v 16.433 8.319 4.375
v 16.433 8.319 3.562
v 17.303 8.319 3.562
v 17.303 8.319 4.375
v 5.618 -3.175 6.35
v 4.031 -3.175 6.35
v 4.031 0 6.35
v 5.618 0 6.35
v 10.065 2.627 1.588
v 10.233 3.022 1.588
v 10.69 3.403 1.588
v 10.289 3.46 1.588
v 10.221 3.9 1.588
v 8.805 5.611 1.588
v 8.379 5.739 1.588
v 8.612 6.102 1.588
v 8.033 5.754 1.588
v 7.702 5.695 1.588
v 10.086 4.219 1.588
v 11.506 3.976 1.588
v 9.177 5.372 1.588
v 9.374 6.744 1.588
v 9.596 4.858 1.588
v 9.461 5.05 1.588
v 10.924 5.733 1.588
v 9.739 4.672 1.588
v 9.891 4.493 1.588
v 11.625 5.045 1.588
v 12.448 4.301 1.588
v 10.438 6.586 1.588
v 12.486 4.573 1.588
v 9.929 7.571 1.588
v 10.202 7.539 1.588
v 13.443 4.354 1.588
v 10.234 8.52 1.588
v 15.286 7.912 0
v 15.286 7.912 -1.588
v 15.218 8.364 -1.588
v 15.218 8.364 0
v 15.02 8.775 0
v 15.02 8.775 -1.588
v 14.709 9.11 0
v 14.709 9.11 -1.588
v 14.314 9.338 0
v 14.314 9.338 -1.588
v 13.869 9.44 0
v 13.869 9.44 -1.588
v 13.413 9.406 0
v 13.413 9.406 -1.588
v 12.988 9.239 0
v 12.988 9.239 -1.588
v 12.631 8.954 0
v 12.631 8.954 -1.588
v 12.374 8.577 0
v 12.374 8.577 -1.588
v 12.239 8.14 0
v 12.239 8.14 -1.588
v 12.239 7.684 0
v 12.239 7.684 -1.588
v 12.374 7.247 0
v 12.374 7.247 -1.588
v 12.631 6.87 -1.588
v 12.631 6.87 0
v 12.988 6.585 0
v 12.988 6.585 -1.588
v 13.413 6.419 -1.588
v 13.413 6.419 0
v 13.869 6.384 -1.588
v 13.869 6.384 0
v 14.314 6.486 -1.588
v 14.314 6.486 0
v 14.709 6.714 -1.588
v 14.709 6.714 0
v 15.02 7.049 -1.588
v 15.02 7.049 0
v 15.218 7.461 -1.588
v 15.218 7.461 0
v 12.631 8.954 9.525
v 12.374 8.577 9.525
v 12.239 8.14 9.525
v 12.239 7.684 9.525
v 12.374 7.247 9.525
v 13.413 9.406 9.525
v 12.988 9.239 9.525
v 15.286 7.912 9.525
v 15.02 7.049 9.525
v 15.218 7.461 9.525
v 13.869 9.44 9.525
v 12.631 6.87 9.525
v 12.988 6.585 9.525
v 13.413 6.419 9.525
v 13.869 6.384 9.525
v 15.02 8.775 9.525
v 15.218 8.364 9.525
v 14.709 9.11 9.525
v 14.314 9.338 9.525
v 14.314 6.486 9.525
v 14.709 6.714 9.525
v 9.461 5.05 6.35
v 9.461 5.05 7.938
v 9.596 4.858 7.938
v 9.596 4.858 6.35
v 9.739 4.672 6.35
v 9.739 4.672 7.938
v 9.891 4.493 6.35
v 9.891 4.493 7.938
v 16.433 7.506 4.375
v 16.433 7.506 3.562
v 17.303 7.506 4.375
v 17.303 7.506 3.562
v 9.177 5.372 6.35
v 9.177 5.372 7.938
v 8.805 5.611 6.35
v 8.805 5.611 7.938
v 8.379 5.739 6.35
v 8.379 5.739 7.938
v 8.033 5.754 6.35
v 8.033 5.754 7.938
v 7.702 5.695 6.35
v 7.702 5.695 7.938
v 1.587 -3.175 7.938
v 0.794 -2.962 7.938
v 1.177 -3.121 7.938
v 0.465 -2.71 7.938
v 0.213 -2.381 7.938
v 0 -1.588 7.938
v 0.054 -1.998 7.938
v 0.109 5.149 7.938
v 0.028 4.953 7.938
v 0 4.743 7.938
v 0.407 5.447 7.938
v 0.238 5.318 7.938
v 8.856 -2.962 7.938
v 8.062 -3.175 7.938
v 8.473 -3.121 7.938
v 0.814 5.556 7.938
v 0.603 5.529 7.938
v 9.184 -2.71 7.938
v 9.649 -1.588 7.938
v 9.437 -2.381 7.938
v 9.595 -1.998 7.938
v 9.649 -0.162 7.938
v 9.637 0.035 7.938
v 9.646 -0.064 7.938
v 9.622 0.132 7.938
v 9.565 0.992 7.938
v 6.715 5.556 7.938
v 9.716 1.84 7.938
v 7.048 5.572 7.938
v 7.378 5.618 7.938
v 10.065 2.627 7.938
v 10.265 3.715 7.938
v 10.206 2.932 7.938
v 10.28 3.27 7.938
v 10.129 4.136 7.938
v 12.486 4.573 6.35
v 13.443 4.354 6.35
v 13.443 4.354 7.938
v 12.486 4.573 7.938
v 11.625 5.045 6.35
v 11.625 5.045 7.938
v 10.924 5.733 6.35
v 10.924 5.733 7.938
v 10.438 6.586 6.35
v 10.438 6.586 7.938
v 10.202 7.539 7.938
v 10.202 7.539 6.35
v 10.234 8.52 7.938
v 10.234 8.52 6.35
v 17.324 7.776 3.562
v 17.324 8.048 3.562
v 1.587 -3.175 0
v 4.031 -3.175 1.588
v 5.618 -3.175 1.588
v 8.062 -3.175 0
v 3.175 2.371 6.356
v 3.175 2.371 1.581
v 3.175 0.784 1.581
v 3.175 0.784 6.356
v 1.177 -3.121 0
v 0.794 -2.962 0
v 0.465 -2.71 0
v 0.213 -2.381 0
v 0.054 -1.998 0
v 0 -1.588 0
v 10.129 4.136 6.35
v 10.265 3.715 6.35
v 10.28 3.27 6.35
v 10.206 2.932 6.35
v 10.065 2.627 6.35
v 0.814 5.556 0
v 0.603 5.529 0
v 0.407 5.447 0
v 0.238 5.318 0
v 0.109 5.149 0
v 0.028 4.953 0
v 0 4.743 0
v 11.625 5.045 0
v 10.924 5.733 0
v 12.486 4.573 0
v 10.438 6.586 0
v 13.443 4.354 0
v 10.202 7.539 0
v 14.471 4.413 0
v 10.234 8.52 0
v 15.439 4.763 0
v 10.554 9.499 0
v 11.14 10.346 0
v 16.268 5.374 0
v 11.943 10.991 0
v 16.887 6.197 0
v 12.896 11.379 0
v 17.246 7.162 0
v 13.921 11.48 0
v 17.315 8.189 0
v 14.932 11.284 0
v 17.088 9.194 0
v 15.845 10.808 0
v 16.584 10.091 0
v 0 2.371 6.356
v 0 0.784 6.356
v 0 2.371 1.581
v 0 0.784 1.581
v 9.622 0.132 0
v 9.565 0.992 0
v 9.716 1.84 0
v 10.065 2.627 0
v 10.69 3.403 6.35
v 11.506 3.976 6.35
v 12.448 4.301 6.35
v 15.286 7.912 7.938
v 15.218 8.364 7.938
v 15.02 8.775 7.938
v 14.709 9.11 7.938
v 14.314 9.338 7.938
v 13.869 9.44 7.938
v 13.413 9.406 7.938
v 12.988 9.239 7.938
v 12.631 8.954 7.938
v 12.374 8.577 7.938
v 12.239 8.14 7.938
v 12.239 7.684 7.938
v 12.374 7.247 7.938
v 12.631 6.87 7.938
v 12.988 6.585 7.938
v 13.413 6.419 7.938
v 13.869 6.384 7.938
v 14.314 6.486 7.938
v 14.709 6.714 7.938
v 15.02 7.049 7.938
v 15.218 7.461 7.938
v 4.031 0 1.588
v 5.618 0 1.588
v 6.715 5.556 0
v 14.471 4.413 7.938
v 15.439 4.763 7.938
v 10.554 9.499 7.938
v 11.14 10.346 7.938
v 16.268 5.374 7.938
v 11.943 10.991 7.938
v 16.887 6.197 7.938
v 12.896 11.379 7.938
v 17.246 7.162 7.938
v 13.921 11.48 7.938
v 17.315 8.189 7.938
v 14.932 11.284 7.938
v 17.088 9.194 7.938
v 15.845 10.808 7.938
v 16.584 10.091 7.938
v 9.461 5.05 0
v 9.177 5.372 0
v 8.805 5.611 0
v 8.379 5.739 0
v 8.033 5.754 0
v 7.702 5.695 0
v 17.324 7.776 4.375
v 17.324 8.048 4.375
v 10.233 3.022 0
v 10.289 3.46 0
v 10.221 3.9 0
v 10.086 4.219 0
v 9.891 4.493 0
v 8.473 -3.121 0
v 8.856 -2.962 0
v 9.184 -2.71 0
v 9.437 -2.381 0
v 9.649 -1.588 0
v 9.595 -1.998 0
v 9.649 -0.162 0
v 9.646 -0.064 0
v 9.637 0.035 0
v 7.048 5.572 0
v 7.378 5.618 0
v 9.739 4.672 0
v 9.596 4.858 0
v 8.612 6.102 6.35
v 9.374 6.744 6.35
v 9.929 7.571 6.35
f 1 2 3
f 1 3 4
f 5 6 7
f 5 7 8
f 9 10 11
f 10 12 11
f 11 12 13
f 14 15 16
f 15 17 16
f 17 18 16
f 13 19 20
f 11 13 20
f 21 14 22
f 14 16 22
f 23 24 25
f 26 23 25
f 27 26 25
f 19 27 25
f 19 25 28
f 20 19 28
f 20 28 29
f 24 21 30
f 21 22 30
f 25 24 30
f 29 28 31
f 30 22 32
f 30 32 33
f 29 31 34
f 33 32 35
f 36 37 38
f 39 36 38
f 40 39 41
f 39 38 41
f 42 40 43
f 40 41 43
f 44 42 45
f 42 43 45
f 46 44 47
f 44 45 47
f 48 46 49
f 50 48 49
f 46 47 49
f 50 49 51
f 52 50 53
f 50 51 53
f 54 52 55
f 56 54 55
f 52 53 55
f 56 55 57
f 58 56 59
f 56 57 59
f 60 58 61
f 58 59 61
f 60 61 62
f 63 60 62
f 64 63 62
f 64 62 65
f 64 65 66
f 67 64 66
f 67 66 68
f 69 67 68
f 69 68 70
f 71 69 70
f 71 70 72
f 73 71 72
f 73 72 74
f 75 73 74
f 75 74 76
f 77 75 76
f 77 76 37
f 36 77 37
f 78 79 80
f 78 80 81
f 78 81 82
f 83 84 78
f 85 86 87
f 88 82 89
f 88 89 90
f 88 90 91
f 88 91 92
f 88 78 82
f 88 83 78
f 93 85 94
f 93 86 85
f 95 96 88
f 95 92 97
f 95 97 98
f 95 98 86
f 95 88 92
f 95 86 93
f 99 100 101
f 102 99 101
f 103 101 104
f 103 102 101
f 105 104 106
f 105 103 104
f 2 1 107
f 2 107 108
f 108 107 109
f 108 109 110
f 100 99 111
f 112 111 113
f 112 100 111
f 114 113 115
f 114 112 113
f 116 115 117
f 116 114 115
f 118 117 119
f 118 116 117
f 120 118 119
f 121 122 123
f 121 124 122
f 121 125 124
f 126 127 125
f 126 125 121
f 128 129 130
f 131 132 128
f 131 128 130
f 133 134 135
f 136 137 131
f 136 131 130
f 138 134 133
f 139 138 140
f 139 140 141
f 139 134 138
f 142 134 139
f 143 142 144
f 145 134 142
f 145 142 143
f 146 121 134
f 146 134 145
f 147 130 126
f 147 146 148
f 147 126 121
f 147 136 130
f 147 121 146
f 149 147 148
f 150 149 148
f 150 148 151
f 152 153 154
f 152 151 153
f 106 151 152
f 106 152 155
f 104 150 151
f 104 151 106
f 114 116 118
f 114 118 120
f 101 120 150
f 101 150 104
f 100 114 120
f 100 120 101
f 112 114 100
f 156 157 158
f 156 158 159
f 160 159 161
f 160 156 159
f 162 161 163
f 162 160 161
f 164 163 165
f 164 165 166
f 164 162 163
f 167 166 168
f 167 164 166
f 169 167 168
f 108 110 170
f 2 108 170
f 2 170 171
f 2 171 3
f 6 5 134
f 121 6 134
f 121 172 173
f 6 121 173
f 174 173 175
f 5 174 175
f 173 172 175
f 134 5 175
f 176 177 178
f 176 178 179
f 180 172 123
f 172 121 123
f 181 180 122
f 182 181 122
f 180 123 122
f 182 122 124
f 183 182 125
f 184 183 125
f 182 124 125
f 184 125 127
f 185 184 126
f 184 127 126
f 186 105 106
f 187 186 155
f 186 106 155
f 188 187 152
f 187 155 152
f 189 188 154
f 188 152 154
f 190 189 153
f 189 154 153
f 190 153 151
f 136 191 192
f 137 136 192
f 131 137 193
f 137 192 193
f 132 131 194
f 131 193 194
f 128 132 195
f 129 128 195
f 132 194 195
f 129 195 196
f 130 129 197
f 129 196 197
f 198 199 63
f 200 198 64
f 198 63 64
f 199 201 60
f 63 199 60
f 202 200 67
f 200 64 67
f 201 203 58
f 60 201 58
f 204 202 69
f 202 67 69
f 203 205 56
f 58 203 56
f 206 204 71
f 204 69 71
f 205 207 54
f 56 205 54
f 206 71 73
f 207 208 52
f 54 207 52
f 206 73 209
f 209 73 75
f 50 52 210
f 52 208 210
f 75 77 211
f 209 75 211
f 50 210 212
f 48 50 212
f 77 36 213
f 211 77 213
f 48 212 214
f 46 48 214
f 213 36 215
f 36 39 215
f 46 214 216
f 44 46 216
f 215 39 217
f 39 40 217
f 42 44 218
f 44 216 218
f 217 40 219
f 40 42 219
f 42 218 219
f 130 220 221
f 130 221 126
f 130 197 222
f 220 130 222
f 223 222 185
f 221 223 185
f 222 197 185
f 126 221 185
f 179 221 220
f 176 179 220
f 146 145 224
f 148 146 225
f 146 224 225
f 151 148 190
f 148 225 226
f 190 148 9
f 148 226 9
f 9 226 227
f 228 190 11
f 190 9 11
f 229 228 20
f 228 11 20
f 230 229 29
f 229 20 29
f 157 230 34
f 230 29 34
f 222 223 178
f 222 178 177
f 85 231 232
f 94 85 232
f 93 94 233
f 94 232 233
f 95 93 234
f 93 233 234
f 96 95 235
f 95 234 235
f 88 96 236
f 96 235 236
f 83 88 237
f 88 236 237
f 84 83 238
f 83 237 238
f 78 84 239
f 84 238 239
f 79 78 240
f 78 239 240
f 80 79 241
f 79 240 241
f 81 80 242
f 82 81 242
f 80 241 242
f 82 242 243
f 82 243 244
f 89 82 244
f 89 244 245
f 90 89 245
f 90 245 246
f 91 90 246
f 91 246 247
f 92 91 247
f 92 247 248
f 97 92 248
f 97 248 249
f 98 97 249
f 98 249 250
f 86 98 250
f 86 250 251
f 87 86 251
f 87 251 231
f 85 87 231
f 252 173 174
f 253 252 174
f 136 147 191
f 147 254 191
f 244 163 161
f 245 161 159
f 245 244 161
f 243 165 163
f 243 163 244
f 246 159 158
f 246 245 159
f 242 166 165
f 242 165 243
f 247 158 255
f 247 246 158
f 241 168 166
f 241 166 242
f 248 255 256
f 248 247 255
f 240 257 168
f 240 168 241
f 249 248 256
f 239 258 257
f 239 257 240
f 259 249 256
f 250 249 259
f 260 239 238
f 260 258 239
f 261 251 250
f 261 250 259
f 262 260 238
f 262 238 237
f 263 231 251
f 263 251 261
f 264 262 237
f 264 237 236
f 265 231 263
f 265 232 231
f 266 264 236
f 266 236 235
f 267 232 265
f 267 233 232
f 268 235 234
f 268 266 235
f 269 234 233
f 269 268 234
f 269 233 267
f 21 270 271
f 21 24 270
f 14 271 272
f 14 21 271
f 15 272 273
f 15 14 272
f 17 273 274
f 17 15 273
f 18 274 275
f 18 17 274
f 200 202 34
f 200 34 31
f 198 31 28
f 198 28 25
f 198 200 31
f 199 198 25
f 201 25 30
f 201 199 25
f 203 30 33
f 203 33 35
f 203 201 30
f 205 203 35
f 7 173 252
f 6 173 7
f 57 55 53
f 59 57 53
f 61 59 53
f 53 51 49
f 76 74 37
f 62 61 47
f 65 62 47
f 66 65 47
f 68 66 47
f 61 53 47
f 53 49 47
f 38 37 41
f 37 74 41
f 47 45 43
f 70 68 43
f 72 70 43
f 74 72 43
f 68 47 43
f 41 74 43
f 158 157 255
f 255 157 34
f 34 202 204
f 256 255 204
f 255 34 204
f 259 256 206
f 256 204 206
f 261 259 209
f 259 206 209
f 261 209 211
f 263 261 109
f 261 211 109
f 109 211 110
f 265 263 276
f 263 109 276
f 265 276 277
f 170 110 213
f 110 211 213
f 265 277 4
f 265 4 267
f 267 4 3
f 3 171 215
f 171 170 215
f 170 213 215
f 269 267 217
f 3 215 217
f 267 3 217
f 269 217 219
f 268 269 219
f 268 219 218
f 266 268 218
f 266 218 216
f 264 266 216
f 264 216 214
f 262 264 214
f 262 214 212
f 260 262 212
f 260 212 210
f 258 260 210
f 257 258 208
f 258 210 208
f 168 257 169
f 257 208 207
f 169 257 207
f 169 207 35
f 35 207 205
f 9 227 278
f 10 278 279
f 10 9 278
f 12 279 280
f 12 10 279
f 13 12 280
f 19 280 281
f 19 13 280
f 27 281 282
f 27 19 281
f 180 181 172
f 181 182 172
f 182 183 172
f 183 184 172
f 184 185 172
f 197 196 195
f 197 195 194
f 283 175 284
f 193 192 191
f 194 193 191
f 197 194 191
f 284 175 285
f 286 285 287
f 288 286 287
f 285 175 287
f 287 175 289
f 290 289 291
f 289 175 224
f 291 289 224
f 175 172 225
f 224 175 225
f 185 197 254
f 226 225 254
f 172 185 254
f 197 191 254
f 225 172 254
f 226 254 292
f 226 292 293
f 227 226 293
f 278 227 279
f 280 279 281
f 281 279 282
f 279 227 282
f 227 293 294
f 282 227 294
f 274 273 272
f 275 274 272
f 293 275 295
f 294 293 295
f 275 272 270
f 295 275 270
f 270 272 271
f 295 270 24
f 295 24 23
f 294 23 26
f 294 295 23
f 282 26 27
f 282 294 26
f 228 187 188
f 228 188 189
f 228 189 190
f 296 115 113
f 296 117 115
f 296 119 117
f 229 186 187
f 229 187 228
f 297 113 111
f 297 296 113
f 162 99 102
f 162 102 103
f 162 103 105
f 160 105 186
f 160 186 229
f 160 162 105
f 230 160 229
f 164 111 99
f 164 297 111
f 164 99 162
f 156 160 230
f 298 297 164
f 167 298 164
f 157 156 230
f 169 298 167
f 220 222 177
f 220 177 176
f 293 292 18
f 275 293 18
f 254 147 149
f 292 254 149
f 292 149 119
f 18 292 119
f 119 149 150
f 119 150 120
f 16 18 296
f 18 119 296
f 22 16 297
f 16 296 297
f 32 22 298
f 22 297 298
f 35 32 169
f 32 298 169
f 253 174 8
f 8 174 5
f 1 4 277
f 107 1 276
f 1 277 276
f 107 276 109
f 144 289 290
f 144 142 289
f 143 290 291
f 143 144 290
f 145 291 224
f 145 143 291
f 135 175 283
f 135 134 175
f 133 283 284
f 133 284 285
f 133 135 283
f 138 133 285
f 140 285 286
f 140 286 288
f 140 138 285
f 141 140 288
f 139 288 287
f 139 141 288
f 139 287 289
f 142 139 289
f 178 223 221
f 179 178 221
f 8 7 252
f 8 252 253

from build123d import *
from build123d.topology import SkipClean

# Parameters (mm, degrees)
SKETCH3_R                = 1.5319375
BOSS_EXTRUDE1_DEPTH      = 7.9375
BOSS_EXTRUDE2_DEPTH      = 9.525
BOSS_EXTRUDE2_DEPTH_BACK = 1.5875
SKETCH3_4_R              = 1.5319375
FILLET1_R                = 1.5875
SKETCH4_W                = 1.5875
SKETCH4_H                = 4.7625
CUT_EXTRUDE1_DEPTH       = 3.175
SKETCH5_W                = 4.7752
SKETCH5_H                = 1.5875
CUT_EXTRUDE2_DEPTH       = 3.175
FILLET2_R                = 3.571875
SKETCH6_W                = 0.8128
SKETCH6_H                = 0.8128
CUT_EXTRUDE4_DEPTH       = 0.89281
CUT_EXTRUDE6_START       = -1.5875
CUT_EXTRUDE6_DEPTH       = 1.5875
CUT_EXTRUDE7_START       = -7.9375
CUT_EXTRUDE7_DEPTH       = 1.5875
FILLET4_R                = 1.5875


with BuildPart() as part:
    # Sketch3 → Boss-Extrude1 (new body)
    with BuildSketch(Plane.XY):
        with BuildLine():
            ThreePointArc((0.813693974, 5.55625), (0.238325447, 5.317924553), (0, 4.742556026))
            Line((0, 4.742556026), (0, -3.175))
            Line((0, -3.175), (9.649461258, -3.175))
            Line((9.649461258, -3.175), (9.649461258, 0))
            ThreePointArc((9.649461258, 0), (10.438552252, 3.141997614), (13.44291972, 4.353851449))
            ThreePointArc((13.44291972, 4.353851449), (15.368414392, 11.098464078), (11.069438658, 5.55625))
            Line((11.069438658, 5.55625), (0.813693974, 5.55625))
        make_face()
        with Locations((13.754229109, 7.912134389)):
            Circle(SKETCH3_R, mode=Mode.SUBTRACT)
    extrude(amount=BOSS_EXTRUDE1_DEPTH)

    # Sketch3<4> → Boss-Extrude2 (add, two sides: drawn at the far end of the back side and taken through both)
    with BuildSketch(Plane.XY.offset(-BOSS_EXTRUDE2_DEPTH_BACK)):
        with Locations((13.754229109, 7.912134389)):
            Circle(SKETCH3_4_R)
    extrude(amount=BOSS_EXTRUDE2_DEPTH + BOSS_EXTRUDE2_DEPTH_BACK)

    # Fillet1
    fillet1_edges = [part.edges().sort_by_distance(p)[0] for p in [
        (9.649461258, 0, 3.96875),
        (9.649461258, -3.175, 3.96875),
        (0, -3.175, 3.96875),
    ]]
    fillet(fillet1_edges, radius=FILLET1_R)

    # Sketch4 → Cut-Extrude1 (cut)
    with BuildSketch(Plane.XZ.offset(3.175)):
        with Locations((4.824730629, 3.96875)):
            Rectangle(SKETCH4_W, SKETCH4_H)
    extrude(amount=-CUT_EXTRUDE1_DEPTH, mode=Mode.SUBTRACT)

    # Sketch5 → Cut-Extrude2 (cut)
    with BuildSketch(Plane.ZY):
        with Locations((3.96875, 1.577528013)):
            Rectangle(SKETCH5_W, SKETCH5_H)
    extrude(amount=-CUT_EXTRUDE2_DEPTH, mode=Mode.SUBTRACT)

    # Fillet2
    fillet2_edges = [part.edges().sort_by_distance(p)[0] for p in [
        (11.069438658, 5.55625, 3.96875),
    ]]
    fillet(fillet2_edges, radius=FILLET2_R)

    # Sketch6 → Cut-Extrude4 (cut)
    with BuildSketch(Plane(origin=(17.326104109, 0, 0), x_dir=(0, 0, -1), z_dir=(1, 0, 0))):
        with Locations((-3.96875, 7.912134389)):
            Rectangle(SKETCH6_W, SKETCH6_H)
    extrude(amount=-CUT_EXTRUDE4_DEPTH, mode=Mode.SUBTRACT)

    # Sketch7 → Cut-Extrude6 (cut)
    with SkipClean():  # the faces are left unmerged after this step: merging them gives an invalid solid
        with BuildSketch(Plane.XY.offset(7.9375).offset(CUT_EXTRUDE6_START)):
            with BuildLine():
                ThreePointArc((13.44291969, 4.353851452), (10.924260793, 5.732783489), (10.234480151, 8.520129694))
                ThreePointArc((10.234480151, 8.520129694), (9.762713445, 7.265842741), (8.861926483, 6.273682251))
                ThreePointArc((8.861926483, 6.273682251), (9.666497097, 4.764183089), (10.920382704, 3.600700179))
                ThreePointArc((10.920382704, 3.600700179), (12.109733834, 4.218149348), (13.44291969, 4.353851452))
            make_face()
        extrude(amount=CUT_EXTRUDE6_DEPTH, mode=Mode.SUBTRACT)

    # Sketch7<6> → Cut-Extrude7 (cut)
    with SkipClean():  # the faces are left unmerged after this step: merging them gives an invalid solid
        with BuildSketch(Plane.XY.offset(7.9375).offset(CUT_EXTRUDE7_START)):
            with BuildLine():
                ThreePointArc((13.44291969, 4.353851452), (10.924260793, 5.732783489), (10.234480151, 8.520129694))
                ThreePointArc((10.234480151, 8.520129694), (9.762713445, 7.265842741), (8.861926483, 6.273682251))
                ThreePointArc((8.861926483, 6.273682251), (9.666497097, 4.764183089), (10.920382704, 3.600700179))
                ThreePointArc((10.920382704, 3.600700179), (12.109733834, 4.218149348), (13.44291969, 4.353851452))
            make_face()
        extrude(amount=CUT_EXTRUDE7_DEPTH, mode=Mode.SUBTRACT)

    # Fillet4
    fillet4_edges = [part.edges().sort_by_distance(p)[0] for p in [
        (10.920382704, 3.600700179, 0.79375),
        (10.920382704, 3.600700179, 7.14375),
        (8.861926483, 6.273682251, 7.14375),
        (8.861926483, 6.273682251, 0.79375),
    ]]
    fillet(fillet4_edges, radius=FILLET4_R)


solid = part.part
